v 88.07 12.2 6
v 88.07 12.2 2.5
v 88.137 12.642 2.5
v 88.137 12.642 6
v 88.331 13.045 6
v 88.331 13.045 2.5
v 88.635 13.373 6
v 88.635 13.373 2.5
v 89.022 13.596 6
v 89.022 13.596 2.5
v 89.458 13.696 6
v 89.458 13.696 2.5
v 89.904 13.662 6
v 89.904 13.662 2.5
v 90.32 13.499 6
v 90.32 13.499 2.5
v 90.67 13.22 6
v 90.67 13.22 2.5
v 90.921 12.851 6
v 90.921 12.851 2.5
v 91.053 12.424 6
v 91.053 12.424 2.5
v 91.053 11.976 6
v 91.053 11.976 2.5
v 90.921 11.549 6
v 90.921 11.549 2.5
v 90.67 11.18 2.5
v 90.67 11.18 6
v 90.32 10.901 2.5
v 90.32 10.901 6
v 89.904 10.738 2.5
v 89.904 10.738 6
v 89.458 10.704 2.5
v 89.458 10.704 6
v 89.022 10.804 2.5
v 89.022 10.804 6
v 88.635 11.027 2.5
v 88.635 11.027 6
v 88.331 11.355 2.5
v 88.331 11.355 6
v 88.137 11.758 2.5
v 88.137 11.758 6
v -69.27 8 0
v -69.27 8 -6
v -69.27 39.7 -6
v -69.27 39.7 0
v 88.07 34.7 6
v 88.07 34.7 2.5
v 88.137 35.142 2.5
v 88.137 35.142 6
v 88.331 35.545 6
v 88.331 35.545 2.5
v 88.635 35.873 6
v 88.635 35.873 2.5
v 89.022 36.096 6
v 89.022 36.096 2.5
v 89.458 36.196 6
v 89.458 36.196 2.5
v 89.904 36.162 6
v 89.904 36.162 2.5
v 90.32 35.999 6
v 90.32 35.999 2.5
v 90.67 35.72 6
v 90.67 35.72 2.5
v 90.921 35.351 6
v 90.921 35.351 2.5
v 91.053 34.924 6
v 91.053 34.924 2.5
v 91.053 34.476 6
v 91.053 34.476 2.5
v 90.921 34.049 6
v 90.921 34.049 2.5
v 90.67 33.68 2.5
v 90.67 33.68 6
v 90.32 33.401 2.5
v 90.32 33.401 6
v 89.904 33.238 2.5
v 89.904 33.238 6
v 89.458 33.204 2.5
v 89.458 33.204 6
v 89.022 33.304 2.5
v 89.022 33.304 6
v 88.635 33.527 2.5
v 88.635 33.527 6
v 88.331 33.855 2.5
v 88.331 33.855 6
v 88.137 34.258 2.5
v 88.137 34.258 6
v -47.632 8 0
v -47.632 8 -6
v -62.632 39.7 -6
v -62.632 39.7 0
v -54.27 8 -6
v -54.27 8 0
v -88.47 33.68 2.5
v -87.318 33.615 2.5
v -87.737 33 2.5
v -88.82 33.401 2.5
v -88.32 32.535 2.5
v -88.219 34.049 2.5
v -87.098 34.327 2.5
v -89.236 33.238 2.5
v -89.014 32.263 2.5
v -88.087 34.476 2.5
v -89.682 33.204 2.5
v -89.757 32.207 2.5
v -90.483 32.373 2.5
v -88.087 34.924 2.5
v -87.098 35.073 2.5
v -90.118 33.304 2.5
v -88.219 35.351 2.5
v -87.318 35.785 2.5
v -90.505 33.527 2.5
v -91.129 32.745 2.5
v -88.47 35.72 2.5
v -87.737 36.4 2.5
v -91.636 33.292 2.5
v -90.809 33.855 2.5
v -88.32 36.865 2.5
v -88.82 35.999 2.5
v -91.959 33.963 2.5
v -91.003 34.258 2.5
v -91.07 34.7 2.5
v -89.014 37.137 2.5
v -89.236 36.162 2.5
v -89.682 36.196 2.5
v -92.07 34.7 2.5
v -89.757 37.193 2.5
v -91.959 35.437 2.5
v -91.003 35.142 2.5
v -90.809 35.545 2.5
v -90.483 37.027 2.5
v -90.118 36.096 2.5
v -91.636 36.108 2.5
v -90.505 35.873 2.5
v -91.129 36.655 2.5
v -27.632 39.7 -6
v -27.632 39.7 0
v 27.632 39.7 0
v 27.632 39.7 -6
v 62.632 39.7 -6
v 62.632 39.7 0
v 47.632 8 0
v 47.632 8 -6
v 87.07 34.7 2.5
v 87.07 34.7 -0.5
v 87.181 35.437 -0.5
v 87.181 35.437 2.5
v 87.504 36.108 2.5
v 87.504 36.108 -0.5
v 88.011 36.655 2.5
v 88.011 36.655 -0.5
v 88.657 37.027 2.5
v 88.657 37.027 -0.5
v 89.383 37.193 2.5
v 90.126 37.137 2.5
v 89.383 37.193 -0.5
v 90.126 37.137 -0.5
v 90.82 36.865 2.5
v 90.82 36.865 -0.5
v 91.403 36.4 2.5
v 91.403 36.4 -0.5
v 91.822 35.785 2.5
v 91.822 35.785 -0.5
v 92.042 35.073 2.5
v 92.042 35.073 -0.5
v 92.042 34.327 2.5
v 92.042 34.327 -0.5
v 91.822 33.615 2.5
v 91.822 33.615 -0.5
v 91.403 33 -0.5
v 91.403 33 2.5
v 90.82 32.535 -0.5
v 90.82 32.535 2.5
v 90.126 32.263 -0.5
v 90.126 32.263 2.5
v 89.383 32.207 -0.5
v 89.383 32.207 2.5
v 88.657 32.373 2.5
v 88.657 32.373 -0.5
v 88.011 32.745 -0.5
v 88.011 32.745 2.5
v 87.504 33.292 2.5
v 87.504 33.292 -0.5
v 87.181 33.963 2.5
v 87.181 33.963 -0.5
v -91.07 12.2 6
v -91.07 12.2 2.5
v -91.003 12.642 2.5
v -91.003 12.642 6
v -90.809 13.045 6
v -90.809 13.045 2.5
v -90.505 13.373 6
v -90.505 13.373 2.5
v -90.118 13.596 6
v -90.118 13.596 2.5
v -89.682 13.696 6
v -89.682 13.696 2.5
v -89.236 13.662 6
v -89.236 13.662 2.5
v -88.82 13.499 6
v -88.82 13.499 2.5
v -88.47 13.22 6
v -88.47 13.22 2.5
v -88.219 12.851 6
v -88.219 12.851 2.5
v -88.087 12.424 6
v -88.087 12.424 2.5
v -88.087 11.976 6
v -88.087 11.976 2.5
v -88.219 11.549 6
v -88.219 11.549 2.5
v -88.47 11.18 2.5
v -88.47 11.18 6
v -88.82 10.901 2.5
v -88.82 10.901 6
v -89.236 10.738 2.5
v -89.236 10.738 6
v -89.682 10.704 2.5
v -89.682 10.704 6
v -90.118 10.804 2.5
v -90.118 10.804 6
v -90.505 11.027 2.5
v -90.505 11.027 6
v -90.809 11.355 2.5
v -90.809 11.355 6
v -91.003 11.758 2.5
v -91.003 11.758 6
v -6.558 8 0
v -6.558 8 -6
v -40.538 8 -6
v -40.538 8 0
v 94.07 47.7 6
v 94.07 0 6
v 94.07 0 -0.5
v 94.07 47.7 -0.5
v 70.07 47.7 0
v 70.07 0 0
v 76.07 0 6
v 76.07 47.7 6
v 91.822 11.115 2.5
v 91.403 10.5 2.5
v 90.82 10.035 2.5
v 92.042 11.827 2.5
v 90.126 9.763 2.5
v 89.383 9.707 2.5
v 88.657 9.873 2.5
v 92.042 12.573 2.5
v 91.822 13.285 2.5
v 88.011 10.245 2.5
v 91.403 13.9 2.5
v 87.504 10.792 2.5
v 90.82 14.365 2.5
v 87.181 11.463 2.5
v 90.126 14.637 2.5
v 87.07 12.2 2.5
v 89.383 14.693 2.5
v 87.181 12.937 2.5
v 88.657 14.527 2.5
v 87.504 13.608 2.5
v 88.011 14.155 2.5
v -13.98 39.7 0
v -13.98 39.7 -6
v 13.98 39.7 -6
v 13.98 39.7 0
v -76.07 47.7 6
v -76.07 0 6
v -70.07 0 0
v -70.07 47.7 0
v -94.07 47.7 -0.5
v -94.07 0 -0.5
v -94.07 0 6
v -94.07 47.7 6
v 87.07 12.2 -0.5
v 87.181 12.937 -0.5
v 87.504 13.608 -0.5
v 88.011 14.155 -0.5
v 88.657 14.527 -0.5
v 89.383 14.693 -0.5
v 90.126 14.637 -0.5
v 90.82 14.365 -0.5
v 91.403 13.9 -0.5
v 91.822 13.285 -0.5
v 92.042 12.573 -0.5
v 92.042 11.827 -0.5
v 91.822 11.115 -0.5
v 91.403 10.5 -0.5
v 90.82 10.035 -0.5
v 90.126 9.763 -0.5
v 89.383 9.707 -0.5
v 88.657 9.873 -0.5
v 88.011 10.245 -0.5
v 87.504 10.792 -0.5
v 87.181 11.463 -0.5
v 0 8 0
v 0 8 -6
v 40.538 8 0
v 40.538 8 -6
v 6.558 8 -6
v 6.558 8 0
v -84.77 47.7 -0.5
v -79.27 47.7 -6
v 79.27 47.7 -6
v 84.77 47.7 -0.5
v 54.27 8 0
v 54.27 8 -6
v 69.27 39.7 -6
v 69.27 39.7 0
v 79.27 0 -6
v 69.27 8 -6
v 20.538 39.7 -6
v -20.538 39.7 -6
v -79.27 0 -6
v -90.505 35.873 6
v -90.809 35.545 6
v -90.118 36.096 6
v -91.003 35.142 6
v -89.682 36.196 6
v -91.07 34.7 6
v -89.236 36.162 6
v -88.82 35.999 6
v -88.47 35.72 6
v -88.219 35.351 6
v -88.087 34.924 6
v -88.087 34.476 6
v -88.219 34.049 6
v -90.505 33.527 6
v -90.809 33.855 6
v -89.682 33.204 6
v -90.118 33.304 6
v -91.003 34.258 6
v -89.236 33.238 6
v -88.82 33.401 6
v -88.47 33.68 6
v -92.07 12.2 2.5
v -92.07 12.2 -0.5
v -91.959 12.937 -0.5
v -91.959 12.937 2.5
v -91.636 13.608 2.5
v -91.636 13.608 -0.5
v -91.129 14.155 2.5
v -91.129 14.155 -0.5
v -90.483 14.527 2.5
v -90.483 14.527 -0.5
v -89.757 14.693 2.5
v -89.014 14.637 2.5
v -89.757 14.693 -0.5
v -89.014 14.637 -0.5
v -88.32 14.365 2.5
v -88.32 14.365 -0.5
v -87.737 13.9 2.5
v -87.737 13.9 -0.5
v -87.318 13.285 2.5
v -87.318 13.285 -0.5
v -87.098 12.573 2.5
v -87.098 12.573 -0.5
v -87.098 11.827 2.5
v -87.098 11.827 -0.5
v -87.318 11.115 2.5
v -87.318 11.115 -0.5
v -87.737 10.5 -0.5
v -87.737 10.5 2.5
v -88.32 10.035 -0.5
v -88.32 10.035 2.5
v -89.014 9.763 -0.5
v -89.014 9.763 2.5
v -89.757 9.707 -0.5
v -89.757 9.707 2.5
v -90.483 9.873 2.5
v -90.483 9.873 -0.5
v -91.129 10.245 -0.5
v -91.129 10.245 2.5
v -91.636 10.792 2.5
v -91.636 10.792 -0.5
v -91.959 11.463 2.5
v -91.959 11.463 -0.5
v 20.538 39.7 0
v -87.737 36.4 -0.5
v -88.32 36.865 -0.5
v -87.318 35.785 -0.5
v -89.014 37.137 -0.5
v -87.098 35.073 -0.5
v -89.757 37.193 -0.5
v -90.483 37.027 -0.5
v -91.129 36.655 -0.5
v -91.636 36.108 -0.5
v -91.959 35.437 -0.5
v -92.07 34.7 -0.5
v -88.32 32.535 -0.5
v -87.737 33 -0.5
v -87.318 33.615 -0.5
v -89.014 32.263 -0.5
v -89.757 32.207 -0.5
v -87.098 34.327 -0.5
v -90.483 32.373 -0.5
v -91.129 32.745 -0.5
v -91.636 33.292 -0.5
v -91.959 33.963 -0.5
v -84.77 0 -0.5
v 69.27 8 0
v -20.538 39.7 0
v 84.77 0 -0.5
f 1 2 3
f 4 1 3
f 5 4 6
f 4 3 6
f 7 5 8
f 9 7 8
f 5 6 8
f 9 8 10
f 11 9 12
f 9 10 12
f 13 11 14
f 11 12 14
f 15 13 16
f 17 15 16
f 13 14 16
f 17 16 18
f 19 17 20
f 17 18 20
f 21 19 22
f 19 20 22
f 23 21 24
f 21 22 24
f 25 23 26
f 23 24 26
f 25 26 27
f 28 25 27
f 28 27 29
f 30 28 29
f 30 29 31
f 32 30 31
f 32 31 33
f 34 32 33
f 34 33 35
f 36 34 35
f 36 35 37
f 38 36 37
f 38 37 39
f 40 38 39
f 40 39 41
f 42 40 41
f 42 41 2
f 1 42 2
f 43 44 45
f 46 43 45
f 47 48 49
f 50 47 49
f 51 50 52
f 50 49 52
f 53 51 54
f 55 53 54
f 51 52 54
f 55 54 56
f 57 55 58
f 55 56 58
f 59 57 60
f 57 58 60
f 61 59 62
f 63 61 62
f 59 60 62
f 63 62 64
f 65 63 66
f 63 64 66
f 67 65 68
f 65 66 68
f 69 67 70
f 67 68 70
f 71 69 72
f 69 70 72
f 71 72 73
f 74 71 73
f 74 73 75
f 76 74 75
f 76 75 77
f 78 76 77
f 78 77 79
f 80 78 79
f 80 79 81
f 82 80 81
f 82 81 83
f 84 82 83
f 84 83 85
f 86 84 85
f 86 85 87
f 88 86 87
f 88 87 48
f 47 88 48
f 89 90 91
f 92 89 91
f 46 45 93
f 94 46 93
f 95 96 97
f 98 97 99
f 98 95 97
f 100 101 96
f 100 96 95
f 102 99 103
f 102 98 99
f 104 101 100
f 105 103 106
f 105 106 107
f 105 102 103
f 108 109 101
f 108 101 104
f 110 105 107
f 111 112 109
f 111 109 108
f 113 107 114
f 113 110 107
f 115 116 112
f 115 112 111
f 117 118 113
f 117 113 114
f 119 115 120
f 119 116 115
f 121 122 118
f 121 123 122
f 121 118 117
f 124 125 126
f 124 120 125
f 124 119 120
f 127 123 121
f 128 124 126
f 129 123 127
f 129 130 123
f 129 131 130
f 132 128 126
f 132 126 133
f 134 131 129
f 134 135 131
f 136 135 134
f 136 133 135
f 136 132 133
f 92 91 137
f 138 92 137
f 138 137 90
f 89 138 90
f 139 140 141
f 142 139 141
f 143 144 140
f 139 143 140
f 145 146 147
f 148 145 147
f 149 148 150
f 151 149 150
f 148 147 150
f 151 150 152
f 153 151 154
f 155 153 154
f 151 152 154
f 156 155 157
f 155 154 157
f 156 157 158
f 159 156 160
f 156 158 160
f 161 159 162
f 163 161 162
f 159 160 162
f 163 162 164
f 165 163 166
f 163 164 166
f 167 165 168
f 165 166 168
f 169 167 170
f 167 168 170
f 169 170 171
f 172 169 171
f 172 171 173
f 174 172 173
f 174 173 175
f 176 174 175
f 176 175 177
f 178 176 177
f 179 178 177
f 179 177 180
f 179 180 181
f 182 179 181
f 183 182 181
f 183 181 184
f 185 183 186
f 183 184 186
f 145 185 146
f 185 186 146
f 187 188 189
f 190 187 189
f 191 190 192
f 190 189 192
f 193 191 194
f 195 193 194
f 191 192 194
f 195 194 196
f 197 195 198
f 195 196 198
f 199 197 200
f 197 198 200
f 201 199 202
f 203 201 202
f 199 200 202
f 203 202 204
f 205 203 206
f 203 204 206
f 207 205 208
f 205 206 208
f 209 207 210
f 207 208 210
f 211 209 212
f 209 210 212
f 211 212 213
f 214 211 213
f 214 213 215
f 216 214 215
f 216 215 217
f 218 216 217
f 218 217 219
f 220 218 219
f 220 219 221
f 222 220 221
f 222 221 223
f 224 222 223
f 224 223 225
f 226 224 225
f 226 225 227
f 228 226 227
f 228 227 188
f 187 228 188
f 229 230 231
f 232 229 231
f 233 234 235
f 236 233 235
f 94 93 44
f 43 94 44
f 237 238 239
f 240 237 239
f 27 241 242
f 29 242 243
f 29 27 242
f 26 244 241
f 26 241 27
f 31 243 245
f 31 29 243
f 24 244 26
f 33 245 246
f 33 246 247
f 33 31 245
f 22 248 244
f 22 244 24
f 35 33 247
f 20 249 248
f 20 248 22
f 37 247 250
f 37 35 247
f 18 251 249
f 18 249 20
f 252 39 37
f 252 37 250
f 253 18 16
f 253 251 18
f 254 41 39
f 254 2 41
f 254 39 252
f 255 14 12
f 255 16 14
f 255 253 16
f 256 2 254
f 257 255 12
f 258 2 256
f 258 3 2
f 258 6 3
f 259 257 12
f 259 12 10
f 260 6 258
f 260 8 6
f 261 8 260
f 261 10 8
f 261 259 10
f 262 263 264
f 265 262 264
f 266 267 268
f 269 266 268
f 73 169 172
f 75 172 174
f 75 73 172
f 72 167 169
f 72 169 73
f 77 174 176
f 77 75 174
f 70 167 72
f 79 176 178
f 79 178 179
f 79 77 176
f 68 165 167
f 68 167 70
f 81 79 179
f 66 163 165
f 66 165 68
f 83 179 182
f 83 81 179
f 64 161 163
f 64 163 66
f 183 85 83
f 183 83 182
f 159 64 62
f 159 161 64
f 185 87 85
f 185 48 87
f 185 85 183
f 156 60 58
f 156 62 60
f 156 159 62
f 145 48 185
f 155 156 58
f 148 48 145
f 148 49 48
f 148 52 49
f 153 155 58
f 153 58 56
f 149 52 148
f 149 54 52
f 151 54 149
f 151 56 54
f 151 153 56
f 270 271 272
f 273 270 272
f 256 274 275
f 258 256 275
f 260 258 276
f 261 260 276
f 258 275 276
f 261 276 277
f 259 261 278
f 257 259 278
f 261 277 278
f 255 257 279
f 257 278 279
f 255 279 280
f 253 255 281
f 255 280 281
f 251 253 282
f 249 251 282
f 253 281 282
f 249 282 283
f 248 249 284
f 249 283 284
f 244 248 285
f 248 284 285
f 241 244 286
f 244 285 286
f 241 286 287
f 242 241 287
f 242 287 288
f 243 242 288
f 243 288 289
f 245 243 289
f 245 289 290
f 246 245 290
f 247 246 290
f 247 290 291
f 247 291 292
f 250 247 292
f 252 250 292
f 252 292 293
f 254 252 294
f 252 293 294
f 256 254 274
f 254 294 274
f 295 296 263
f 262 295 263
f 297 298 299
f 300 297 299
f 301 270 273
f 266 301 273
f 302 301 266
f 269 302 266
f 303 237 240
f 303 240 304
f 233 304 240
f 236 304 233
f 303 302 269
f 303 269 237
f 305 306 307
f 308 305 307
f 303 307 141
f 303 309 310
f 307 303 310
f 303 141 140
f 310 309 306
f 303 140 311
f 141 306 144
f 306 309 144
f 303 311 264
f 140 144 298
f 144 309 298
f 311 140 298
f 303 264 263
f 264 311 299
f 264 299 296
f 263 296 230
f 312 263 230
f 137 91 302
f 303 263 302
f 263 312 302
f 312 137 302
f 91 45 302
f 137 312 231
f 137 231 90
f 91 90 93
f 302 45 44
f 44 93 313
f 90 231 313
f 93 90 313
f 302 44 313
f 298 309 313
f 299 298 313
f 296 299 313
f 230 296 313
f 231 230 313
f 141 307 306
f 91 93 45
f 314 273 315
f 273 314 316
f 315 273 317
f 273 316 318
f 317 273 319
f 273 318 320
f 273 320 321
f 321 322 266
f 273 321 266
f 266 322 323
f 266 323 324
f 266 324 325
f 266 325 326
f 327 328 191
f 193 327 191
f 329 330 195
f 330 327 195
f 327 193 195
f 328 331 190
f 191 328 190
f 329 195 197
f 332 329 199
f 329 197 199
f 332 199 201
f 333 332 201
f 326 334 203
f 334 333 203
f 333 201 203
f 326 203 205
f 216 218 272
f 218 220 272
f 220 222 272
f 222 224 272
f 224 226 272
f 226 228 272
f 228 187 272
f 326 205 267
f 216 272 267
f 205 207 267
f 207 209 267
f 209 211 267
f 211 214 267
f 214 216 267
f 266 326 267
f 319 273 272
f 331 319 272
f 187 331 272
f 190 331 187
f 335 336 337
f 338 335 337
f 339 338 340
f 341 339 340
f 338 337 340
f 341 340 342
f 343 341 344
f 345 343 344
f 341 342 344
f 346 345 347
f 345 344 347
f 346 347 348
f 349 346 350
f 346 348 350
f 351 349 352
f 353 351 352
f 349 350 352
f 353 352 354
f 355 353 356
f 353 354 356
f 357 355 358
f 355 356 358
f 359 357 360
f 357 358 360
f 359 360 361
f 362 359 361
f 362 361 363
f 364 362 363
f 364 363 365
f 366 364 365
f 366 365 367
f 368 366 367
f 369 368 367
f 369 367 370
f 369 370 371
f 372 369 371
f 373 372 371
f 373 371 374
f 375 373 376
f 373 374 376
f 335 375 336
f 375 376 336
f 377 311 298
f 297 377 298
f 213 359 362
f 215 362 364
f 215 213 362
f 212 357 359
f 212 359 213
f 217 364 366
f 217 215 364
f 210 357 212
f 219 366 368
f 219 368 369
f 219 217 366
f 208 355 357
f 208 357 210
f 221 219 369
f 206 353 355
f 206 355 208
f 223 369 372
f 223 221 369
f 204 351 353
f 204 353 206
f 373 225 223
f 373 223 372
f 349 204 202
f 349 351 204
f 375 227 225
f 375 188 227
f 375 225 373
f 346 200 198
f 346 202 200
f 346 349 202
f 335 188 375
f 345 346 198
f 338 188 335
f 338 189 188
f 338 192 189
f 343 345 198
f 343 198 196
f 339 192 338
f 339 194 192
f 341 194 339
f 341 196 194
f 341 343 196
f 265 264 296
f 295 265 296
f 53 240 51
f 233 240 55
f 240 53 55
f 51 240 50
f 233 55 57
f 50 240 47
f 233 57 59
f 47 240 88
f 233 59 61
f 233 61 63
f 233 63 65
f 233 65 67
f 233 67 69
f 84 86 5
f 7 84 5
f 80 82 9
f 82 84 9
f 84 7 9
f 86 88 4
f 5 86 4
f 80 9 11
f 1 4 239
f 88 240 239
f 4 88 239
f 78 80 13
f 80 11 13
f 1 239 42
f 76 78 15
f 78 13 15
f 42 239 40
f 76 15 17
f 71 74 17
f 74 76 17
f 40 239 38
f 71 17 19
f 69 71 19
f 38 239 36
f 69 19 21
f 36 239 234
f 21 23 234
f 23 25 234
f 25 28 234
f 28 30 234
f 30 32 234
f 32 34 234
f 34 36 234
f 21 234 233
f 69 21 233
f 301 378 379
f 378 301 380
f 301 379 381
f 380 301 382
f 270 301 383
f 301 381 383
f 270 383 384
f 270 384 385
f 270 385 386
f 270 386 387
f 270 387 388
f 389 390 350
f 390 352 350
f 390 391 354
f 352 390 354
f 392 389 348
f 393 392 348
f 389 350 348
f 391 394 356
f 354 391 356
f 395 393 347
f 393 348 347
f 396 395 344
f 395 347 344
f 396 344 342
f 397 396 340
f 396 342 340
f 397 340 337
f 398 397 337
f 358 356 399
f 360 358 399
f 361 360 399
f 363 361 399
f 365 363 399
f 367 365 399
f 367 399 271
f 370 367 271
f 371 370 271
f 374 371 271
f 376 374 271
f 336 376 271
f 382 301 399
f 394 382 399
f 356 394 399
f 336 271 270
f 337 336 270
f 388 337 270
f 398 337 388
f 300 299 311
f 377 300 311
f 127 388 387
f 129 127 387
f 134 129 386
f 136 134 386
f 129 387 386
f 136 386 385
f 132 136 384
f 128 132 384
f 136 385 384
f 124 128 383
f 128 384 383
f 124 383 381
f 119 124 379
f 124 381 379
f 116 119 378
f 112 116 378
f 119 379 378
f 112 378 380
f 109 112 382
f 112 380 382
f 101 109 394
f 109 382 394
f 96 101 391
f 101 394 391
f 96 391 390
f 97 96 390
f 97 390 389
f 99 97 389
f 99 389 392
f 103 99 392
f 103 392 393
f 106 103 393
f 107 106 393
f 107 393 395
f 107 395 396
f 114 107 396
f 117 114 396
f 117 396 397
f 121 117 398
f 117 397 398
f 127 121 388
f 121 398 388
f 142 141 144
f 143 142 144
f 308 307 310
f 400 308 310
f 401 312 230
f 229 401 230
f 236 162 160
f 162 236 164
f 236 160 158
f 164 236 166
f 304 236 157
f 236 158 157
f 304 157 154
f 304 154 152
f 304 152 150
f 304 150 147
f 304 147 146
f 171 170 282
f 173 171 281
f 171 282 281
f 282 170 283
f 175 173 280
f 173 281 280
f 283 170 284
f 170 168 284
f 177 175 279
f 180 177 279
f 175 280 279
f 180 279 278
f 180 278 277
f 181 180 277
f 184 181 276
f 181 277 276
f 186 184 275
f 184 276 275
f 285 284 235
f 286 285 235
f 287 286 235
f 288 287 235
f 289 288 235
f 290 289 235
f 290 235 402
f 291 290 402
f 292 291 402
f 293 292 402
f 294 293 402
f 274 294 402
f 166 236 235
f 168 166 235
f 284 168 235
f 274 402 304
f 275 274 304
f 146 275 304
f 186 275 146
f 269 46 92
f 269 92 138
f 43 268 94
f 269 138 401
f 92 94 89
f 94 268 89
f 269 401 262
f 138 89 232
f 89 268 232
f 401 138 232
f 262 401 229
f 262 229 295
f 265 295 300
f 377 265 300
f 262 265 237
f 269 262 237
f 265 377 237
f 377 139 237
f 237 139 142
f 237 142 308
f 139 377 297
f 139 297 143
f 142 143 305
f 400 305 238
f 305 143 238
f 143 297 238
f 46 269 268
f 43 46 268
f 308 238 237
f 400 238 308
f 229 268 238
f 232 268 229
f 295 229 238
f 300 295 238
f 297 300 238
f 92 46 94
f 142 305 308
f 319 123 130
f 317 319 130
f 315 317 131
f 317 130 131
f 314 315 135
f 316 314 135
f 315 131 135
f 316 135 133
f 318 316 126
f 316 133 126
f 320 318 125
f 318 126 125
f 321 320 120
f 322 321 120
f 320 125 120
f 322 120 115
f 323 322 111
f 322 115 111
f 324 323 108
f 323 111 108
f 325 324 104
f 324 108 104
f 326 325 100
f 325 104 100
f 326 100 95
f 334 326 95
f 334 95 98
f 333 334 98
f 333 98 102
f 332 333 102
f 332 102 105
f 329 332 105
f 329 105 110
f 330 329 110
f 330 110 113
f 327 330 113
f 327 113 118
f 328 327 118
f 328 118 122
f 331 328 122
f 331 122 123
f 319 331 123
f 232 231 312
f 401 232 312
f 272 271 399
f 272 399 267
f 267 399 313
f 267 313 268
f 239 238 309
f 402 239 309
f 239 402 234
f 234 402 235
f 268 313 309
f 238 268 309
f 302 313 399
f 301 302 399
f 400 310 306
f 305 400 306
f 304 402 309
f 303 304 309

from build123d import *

# Parameters (mm, degrees)
EXTRUDE_1_DEPTH     = 47.7
CUT_EXTRUDE_1_DEPTH = 10
SKETCH_4_R          = 1.5
CUT_EXTRUDE_2_DEPTH = 10
SKETCH_6_R          = 2.5
CUT_EXTRUDE_4_DEPTH = 3


with BuildPart() as part:
    # 草图1 → 凸台-拉伸1 (new body)
    with BuildSketch(Plane(origin=(0, 0, 0), x_dir=(1, 0, 0), z_dir=(0, 1, 0))):
        Polygon((70.07, 0), (76.07, -6), (94.07, -6), (94.07, 0.5), (84.77, 0.5), (79.27, 6), (0, 6), (-79.27, 6), (-84.77, 0.5), (-94.07, 0.5), (-94.07, -6), (-76.07, -6), (-70.07, 0), align=None)
    extrude(amount=EXTRUDE_1_DEPTH)

    # 草图2 → 切除-拉伸1 (cut)
    with BuildSketch(Plane(origin=(0, 0, -6), x_dir=(-1, 0, 0), z_dir=(0, 0, -1))):
        Polygon((-69.27, 39.7), (-69.27, 8), (-54.27, 8), align=None)
        Polygon((-27.632185319, 39.7), (-62.632185319, 39.7), (-47.632185319, 8), align=None)
        Polygon((-40.537826527, 8), (-6.557580565, 8), (-20.537826527, 39.7), align=None)
        Polygon((-13.980245962, 39.7), (0, 8), (13.980245962, 39.7), align=None)
        Polygon((6.557580565, 8), (40.537826527, 8), (20.537826527, 39.7), align=None)
        Polygon((27.632185319, 39.7), (47.632185319, 8), (62.632185319, 39.7), align=None)
        Polygon((69.27, 39.7), (54.27, 8), (69.27, 8), align=None)
    extrude(amount=-CUT_EXTRUDE_1_DEPTH, mode=Mode.SUBTRACT)

    # 草图4 → 切除-拉伸2 (cut)
    with BuildSketch(Plane(origin=(0, 0, -0.5), x_dir=(-1, 0, 0), z_dir=(0, 0, -1))):
        with Locations((-89.57, 34.7)):
            Circle(SKETCH_4_R)
        with Locations((-89.57, 12.2)):
            Circle(SKETCH_4_R)
        with Locations((89.57, 34.7)):
            Circle(SKETCH_4_R)
        with Locations((89.57, 12.2)):
            Circle(SKETCH_4_R)
    extrude(amount=-CUT_EXTRUDE_2_DEPTH, mode=Mode.SUBTRACT)

    # 草图6 → 切除-拉伸4 (cut)
    with BuildSketch(Plane(origin=(0, 0, -0.5), x_dir=(-1, 0, 0), z_dir=(0, 0, -1))):
        with Locations((-89.57, 34.7)):
            Circle(SKETCH_6_R)
        with Locations((-89.57, 12.2)):
            Circle(SKETCH_6_R)
        with Locations((89.57, 34.7)):
            Circle(SKETCH_6_R)
        with Locations((89.57, 12.2)):
            Circle(SKETCH_6_R)
    extrude(amount=-CUT_EXTRUDE_4_DEPTH, mode=Mode.SUBTRACT)


solid = part.part
